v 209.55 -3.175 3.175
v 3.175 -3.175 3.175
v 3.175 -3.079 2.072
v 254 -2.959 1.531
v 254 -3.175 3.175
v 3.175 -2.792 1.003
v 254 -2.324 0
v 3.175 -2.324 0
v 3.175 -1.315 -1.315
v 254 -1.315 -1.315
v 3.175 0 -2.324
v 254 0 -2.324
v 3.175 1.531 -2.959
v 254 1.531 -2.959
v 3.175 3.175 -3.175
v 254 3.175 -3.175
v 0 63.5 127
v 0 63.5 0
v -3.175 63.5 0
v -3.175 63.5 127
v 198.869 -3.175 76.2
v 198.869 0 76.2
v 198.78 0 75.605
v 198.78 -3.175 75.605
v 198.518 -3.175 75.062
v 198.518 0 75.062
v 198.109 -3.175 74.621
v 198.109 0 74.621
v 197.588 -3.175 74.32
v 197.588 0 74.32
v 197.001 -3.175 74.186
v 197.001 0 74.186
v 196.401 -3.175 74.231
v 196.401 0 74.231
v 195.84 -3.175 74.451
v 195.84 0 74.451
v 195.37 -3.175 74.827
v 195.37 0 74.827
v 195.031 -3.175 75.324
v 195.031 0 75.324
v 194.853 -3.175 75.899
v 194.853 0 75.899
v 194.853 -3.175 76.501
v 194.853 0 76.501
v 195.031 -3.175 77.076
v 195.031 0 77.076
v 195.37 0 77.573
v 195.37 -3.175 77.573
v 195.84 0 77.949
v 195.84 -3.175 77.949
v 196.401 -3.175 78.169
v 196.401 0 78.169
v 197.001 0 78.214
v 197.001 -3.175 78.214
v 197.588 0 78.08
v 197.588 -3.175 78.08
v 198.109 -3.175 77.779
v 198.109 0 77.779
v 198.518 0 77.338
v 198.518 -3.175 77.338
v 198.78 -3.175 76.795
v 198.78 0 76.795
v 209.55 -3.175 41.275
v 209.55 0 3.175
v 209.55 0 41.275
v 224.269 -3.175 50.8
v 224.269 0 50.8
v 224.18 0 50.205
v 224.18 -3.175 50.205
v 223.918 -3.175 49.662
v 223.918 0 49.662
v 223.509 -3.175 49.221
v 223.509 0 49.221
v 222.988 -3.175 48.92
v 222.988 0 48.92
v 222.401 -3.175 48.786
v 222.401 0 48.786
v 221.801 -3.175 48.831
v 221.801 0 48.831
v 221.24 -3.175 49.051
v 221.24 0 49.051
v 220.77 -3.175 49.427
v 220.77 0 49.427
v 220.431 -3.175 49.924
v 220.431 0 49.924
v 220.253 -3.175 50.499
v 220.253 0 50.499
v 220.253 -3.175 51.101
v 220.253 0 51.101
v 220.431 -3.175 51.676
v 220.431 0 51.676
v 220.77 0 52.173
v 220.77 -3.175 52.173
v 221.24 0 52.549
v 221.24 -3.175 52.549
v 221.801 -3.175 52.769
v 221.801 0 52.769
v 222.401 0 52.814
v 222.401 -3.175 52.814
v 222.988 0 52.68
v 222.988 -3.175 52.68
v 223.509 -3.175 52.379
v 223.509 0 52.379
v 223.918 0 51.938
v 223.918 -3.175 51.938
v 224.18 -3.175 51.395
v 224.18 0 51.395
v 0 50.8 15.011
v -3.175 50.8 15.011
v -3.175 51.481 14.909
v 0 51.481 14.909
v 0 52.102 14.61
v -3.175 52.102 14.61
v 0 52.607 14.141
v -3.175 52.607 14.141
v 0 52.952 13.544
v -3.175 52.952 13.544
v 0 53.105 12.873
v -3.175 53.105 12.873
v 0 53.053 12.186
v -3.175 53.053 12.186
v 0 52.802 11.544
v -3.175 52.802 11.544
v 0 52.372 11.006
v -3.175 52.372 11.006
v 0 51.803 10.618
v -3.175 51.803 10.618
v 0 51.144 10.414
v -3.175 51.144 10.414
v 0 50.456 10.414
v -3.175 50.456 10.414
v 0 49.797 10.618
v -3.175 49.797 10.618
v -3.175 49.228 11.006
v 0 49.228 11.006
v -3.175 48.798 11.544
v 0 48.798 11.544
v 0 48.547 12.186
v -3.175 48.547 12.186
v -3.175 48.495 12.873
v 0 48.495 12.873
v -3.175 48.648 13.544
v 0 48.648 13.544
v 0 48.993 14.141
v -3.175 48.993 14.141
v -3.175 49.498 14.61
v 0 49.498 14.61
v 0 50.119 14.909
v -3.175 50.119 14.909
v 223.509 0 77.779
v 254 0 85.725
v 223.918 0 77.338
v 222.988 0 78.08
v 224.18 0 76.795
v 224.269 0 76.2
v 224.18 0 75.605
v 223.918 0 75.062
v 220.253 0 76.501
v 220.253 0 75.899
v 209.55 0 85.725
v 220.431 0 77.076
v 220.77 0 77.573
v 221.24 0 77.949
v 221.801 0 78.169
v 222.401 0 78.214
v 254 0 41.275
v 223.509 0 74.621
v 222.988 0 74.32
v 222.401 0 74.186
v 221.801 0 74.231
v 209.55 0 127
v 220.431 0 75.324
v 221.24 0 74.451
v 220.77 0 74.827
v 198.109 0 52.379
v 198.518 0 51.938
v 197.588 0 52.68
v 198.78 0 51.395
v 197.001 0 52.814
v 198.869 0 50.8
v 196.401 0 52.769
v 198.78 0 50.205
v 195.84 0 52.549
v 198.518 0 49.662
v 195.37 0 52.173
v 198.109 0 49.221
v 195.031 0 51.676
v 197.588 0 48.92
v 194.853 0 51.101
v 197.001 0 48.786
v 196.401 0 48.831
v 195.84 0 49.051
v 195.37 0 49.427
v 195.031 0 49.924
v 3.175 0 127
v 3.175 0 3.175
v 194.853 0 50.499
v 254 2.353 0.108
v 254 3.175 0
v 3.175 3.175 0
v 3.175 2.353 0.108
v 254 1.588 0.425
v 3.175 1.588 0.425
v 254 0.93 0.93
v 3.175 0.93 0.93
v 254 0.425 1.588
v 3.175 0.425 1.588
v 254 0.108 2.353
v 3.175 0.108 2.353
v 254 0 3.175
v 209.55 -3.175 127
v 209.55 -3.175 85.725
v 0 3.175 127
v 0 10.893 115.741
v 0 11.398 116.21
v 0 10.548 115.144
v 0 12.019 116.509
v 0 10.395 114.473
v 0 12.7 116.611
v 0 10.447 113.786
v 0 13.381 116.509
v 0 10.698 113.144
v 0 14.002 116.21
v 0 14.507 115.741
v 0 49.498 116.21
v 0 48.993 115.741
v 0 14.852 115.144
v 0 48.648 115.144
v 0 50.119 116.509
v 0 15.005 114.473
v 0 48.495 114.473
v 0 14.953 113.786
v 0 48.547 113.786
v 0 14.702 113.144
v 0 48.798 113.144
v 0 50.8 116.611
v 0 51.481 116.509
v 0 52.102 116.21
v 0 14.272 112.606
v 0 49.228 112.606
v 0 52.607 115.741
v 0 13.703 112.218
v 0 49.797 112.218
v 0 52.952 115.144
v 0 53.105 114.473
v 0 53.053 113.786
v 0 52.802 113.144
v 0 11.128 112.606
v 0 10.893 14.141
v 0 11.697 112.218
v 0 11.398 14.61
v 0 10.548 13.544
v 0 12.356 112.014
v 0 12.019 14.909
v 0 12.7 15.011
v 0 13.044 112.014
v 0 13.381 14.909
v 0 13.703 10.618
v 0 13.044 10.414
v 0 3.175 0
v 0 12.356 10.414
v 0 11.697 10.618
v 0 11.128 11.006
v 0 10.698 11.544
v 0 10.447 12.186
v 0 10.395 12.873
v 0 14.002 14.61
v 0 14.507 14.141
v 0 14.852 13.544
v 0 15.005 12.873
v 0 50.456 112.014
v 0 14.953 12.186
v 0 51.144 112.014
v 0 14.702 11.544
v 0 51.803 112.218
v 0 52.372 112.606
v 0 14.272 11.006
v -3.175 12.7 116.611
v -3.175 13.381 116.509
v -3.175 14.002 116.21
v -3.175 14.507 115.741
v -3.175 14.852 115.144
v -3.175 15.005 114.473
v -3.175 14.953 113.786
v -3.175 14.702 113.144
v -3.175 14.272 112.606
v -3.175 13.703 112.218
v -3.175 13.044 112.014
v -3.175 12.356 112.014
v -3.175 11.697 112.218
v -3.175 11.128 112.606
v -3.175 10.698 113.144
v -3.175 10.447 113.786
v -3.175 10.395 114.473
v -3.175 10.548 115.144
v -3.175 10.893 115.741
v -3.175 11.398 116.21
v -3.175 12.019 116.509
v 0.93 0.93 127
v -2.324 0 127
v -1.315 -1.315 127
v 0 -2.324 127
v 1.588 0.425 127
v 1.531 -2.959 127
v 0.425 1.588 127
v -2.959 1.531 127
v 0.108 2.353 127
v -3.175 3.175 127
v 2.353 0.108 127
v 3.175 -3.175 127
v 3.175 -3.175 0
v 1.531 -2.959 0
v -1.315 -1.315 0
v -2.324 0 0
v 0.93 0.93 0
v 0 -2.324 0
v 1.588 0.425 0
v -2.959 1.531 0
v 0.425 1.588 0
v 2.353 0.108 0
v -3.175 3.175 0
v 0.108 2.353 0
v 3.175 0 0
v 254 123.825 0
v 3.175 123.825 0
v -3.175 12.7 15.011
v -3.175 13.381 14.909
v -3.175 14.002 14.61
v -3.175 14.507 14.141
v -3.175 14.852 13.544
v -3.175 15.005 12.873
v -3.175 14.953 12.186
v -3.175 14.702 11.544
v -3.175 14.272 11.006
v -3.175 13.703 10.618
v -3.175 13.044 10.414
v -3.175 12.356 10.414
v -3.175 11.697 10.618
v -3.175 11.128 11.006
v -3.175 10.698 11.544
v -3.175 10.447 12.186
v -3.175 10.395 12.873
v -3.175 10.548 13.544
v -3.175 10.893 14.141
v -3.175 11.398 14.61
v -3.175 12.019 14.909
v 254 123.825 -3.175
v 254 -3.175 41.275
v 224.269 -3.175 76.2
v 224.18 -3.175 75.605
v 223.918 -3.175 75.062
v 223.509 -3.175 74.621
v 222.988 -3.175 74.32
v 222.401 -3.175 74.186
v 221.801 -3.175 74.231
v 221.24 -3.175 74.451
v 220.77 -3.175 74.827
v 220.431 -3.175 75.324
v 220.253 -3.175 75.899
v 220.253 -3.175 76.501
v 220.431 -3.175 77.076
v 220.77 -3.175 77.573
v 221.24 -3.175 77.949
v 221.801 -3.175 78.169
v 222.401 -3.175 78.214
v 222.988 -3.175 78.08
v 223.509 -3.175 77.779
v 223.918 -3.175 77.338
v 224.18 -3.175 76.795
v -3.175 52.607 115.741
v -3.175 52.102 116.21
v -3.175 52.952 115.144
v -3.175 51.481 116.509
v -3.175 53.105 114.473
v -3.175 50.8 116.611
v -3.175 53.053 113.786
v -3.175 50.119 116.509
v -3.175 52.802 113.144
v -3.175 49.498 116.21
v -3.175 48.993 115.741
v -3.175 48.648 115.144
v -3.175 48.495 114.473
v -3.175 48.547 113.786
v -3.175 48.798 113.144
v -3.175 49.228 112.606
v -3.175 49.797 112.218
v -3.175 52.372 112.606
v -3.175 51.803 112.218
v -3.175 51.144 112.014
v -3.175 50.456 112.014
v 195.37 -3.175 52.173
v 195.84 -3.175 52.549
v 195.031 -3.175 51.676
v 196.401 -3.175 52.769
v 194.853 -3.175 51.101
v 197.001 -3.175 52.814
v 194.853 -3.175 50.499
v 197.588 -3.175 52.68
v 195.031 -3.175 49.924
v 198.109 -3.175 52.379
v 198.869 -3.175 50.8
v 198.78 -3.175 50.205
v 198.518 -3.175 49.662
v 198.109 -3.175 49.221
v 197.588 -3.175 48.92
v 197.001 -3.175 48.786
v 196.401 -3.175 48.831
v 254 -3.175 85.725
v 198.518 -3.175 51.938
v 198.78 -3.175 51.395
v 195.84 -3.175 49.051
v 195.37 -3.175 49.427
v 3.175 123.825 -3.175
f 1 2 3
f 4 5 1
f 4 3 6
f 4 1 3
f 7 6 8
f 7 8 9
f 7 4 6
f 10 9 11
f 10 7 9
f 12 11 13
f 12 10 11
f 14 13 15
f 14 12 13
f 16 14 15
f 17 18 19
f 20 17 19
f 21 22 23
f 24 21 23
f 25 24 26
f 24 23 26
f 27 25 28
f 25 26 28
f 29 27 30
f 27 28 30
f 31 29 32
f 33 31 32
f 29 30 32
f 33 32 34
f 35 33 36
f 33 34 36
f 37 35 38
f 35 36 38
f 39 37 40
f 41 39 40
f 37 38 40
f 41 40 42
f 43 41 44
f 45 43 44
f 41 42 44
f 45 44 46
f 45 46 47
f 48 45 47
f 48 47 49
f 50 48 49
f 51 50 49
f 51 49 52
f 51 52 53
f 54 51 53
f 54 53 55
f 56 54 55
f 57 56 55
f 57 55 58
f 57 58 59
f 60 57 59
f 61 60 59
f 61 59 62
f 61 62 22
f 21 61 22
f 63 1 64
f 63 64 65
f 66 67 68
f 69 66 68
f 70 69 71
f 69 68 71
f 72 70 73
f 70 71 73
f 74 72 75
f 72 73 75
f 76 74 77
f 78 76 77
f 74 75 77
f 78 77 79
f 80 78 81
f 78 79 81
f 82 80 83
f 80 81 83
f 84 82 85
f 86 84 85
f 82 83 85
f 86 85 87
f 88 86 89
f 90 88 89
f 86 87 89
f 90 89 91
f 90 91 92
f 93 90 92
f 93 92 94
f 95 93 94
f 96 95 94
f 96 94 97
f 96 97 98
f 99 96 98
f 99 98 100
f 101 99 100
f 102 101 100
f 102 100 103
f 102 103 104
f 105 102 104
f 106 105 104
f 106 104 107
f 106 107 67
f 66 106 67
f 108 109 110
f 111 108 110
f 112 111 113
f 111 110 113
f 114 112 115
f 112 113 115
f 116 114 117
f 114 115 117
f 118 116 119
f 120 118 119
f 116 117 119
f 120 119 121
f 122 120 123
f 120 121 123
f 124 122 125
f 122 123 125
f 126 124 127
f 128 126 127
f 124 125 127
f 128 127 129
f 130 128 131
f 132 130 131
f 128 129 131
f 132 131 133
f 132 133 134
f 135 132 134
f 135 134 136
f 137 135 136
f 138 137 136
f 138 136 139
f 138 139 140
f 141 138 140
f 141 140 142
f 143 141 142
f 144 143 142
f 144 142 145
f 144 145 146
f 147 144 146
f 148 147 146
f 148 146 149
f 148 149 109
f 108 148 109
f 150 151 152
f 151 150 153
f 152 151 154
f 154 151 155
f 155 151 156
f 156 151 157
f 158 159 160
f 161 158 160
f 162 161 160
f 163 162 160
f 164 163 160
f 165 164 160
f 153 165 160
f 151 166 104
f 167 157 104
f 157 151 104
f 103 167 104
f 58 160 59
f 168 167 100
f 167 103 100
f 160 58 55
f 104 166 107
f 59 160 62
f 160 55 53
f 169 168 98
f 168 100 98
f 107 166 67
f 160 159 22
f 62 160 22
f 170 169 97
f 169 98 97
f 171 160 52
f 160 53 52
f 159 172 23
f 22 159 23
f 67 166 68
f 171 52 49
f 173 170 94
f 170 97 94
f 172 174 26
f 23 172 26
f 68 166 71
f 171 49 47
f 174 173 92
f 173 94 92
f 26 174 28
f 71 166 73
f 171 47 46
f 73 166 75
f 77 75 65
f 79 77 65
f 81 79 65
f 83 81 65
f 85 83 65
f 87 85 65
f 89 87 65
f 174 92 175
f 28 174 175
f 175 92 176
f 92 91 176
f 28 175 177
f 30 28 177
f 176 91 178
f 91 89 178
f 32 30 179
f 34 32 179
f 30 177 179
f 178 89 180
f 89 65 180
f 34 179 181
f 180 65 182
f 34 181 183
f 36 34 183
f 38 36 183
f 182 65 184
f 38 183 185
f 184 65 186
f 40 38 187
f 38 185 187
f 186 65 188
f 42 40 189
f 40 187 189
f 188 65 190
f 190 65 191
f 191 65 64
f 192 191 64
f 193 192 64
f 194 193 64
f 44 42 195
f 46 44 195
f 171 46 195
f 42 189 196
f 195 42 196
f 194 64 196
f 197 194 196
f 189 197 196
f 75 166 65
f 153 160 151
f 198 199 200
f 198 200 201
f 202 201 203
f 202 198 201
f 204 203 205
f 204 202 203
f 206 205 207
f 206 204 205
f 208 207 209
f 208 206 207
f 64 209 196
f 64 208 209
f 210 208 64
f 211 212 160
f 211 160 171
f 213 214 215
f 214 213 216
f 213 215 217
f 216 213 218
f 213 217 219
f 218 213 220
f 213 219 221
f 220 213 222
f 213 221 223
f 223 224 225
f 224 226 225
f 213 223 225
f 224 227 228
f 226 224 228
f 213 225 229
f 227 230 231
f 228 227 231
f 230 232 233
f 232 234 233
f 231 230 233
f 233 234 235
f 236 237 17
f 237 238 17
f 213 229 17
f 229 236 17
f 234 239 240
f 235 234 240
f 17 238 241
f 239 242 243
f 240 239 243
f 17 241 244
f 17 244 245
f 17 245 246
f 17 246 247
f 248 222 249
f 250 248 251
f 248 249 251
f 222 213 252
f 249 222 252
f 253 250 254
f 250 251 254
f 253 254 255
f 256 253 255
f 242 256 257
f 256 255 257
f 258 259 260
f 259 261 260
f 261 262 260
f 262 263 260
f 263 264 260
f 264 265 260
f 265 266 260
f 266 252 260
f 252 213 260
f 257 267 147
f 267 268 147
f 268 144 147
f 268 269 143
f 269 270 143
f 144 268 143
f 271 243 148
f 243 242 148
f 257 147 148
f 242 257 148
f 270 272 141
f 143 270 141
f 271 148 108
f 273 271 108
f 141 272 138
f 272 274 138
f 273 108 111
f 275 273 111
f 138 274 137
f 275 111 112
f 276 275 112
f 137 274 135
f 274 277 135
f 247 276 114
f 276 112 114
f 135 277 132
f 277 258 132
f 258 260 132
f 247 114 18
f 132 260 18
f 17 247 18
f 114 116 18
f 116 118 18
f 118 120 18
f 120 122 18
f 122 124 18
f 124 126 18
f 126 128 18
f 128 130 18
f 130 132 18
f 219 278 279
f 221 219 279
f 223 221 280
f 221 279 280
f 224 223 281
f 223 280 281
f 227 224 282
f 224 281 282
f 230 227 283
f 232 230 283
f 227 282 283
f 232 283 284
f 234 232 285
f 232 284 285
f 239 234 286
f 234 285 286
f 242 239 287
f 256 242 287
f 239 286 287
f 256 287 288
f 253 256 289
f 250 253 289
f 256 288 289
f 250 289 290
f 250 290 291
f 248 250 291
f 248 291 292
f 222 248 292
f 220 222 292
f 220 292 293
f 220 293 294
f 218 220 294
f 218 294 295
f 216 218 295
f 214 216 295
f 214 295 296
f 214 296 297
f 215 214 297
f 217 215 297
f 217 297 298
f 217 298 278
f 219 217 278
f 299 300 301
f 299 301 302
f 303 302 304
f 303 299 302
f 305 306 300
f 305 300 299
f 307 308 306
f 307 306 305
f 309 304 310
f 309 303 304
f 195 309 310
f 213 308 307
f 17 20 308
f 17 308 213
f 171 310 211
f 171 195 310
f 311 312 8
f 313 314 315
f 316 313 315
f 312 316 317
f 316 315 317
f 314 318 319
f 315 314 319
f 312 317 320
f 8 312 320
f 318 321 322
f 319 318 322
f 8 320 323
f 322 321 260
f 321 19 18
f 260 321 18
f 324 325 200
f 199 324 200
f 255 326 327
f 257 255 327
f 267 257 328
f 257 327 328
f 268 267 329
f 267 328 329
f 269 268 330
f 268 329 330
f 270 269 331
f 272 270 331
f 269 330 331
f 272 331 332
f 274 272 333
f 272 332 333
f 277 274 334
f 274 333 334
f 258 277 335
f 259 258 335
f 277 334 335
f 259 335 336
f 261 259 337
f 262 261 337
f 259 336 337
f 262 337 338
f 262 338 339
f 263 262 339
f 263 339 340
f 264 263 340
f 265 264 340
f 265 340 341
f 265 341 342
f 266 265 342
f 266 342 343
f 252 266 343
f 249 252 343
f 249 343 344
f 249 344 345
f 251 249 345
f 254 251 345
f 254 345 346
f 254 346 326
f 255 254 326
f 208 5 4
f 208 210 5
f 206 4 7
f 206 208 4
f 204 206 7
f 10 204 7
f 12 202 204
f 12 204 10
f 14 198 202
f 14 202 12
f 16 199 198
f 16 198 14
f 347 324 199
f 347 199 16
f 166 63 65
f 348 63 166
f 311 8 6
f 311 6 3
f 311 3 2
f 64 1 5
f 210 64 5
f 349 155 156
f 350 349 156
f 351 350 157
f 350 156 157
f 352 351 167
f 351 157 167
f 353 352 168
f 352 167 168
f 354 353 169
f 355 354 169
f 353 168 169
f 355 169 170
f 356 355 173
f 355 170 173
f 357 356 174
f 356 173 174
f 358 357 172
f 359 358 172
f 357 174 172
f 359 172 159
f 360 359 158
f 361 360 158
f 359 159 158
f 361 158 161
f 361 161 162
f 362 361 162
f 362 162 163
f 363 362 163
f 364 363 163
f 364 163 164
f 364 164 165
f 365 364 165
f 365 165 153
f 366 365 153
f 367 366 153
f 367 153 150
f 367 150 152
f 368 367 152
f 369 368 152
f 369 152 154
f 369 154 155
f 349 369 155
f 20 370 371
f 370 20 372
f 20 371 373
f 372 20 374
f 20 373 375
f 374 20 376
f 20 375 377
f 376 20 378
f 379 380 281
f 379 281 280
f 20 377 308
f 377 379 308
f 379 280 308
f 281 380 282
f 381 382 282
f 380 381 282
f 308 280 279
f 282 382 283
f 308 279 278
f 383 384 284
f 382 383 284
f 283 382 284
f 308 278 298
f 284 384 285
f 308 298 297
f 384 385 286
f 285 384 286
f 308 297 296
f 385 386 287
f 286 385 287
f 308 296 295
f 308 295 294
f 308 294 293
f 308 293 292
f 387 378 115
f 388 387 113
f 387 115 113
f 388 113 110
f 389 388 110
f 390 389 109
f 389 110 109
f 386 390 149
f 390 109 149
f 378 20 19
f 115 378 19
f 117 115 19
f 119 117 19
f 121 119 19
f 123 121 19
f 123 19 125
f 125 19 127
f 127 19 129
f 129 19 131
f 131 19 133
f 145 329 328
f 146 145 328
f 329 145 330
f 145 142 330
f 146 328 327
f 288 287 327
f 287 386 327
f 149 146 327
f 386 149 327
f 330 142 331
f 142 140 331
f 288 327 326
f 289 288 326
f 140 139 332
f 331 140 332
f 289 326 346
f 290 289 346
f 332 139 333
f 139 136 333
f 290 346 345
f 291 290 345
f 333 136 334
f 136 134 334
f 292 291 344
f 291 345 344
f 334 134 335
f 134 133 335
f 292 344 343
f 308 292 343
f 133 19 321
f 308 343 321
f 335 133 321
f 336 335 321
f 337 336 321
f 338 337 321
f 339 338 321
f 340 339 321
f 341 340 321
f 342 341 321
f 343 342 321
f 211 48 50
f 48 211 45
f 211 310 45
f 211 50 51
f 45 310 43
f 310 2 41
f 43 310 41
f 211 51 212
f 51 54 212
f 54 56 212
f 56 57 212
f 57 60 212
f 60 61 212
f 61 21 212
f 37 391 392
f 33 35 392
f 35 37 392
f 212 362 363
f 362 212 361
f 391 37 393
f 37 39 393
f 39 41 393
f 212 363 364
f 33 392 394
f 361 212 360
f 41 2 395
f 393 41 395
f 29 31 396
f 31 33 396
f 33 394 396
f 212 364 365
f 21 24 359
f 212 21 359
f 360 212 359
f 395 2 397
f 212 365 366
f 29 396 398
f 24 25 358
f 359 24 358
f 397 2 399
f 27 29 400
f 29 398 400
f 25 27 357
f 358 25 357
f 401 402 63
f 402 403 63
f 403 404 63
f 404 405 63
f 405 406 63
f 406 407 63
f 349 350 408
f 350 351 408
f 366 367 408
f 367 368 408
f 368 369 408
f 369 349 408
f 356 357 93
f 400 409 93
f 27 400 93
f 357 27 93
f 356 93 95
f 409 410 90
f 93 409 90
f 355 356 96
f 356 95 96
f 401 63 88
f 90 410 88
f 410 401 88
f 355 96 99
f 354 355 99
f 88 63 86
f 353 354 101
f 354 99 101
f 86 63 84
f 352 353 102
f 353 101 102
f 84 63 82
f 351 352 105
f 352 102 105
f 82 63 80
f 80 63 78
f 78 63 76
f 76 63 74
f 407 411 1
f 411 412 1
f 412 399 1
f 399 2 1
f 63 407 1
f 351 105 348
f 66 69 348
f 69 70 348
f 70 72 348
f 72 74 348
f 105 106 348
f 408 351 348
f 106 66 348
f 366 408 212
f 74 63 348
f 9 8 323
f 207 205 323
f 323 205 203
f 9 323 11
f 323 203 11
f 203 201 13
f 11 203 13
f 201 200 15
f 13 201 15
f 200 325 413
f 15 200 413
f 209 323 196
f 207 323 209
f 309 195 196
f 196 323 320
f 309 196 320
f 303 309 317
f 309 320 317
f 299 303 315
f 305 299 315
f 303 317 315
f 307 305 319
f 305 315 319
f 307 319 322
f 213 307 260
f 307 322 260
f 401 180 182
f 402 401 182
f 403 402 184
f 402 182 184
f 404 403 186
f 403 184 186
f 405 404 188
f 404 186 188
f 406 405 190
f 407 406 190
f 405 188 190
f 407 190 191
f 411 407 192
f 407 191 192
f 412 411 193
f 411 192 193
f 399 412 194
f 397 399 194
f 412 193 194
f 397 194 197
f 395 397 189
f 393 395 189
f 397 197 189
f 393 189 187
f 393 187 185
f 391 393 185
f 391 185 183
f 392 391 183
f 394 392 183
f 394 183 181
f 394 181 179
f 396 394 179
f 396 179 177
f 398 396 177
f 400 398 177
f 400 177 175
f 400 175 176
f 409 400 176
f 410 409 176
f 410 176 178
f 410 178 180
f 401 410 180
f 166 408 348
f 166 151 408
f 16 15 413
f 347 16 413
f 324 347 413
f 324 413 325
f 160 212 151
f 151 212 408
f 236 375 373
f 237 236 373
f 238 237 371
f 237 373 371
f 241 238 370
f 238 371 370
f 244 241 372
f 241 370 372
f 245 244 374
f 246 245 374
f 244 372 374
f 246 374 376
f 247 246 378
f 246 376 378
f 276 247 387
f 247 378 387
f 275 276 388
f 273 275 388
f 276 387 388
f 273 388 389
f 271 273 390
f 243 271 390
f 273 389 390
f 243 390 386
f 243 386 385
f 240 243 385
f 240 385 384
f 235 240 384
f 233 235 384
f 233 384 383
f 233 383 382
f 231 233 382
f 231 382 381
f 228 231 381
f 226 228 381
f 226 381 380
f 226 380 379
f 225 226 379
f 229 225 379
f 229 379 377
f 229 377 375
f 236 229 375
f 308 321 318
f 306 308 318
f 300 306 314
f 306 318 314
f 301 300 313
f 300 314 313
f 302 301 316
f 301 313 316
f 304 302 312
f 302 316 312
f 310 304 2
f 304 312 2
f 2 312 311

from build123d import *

# Parameters (mm, degrees)
BASE_FLANGE4_DEPTH           = 127
EDGE_FLANGE1_STRIP_W         = 19.05
EDGE_FLANGE1_STRIP_H         = 3.175
EDGE_FLANGE1_STRIP_CUT_DEPTH = 250.825
EDGE_FLANGE1_DEPTH           = 250.825
SKETCH28_W                   = 44.45
SKETCH28_H                   = 41.275
SKETCH28_H_2                 = 38.1
CUT_EXTRUDE1_DEPTH           = 312.085197333
F_10_32_TAPPED_HOLE1_D       = 4.0386
F_12_28_TAPPED_HOLE1_D       = 4.6228


# Sheet-metal steps are written as plain solids
with BuildPart() as part:
    # Sketch1 → Base-Flange4 (new body)
    with BuildSketch(Plane.XY):
        with BuildLine():
            Line((254, 0), (3.175, 0))
            ThreePointArc((3.175, 0), (0.92993597, 0.92993597), (0, 3.175))
            Line((0, 3.175), (0, 63.5))
            Line((0, 63.5), (-3.175, 63.5))
            Line((-3.175, 63.5), (-3.175, 3.175))
            ThreePointArc((-3.175, 3.175), (-1.315128061, -1.315128061), (3.175, -3.175))
            Line((3.175, -3.175), (254, -3.175))
            Line((254, -3.175), (254, 0))
        make_face()
    extrude(amount=BASE_FLANGE4_DEPTH)

    # Edge-Flange1 strip (across the edge) → Edge-Flange1 strip cut (cut)
    with BuildSketch(Plane.ZY.offset(-254)):
        with Locations((-6.35, -1.5875)):
            Rectangle(EDGE_FLANGE1_STRIP_W, EDGE_FLANGE1_STRIP_H)
    extrude(amount=EDGE_FLANGE1_STRIP_CUT_DEPTH, mode=Mode.SUBTRACT)

    # Edge-Flange1 section (across the edge) → Edge-Flange1 (add)
    with BuildSketch(Plane.ZY.offset(-254)):
        with BuildLine():
            Line((-3.175, 3.175), (-3.175, 123.825))
            Line((-3.175, 123.825), (0, 123.825))
            Line((0, 123.825), (0, 3.175))
            ThreePointArc((0, 3.175), (0.92993597, 0.92993597), (3.175, 0))
            Line((3.175, 0), (3.175, -3.175))
            ThreePointArc((3.175, -3.175), (-1.315128061, -1.315128061), (-3.175, 3.175))
        make_face()
    extrude(amount=EDGE_FLANGE1_DEPTH)

    # Sketch28 → Cut-Extrude1 (cut, through all)
    with BuildSketch(Plane.XZ.offset(3.175)):
        with Locations((231.775, 106.3625)):
            Rectangle(SKETCH28_W, SKETCH28_H)
        with Locations((231.775, 22.225)):
            Rectangle(SKETCH28_W, SKETCH28_H_2)
    extrude(amount=-CUT_EXTRUDE1_DEPTH, mode=Mode.SUBTRACT)

    # #10-32 Tapped Hole1 (through all)
    with Locations(Plane(origin=(0, -3.175, 0), x_dir=(-1, 0, 0), z_dir=(0, -1, 0))):
        with Locations((-222.25, -50.8), (-196.85, -50.8), (-196.85, -76.2), (-222.25, -76.2)):
            Hole(F_10_32_TAPPED_HOLE1_D / 2)

    # #12-28 Tapped Hole1 (through all)
    with Locations(Plane(origin=(0, 0, 0), x_dir=(0, 0, -1), z_dir=(1, 0, 0))):
        with Locations((-12.7, 50.8), (-12.7, 12.7), (-114.3, 12.7), (-114.3, 50.8)):
            Hole(F_12_28_TAPPED_HOLE1_D / 2)


solid = part.part
